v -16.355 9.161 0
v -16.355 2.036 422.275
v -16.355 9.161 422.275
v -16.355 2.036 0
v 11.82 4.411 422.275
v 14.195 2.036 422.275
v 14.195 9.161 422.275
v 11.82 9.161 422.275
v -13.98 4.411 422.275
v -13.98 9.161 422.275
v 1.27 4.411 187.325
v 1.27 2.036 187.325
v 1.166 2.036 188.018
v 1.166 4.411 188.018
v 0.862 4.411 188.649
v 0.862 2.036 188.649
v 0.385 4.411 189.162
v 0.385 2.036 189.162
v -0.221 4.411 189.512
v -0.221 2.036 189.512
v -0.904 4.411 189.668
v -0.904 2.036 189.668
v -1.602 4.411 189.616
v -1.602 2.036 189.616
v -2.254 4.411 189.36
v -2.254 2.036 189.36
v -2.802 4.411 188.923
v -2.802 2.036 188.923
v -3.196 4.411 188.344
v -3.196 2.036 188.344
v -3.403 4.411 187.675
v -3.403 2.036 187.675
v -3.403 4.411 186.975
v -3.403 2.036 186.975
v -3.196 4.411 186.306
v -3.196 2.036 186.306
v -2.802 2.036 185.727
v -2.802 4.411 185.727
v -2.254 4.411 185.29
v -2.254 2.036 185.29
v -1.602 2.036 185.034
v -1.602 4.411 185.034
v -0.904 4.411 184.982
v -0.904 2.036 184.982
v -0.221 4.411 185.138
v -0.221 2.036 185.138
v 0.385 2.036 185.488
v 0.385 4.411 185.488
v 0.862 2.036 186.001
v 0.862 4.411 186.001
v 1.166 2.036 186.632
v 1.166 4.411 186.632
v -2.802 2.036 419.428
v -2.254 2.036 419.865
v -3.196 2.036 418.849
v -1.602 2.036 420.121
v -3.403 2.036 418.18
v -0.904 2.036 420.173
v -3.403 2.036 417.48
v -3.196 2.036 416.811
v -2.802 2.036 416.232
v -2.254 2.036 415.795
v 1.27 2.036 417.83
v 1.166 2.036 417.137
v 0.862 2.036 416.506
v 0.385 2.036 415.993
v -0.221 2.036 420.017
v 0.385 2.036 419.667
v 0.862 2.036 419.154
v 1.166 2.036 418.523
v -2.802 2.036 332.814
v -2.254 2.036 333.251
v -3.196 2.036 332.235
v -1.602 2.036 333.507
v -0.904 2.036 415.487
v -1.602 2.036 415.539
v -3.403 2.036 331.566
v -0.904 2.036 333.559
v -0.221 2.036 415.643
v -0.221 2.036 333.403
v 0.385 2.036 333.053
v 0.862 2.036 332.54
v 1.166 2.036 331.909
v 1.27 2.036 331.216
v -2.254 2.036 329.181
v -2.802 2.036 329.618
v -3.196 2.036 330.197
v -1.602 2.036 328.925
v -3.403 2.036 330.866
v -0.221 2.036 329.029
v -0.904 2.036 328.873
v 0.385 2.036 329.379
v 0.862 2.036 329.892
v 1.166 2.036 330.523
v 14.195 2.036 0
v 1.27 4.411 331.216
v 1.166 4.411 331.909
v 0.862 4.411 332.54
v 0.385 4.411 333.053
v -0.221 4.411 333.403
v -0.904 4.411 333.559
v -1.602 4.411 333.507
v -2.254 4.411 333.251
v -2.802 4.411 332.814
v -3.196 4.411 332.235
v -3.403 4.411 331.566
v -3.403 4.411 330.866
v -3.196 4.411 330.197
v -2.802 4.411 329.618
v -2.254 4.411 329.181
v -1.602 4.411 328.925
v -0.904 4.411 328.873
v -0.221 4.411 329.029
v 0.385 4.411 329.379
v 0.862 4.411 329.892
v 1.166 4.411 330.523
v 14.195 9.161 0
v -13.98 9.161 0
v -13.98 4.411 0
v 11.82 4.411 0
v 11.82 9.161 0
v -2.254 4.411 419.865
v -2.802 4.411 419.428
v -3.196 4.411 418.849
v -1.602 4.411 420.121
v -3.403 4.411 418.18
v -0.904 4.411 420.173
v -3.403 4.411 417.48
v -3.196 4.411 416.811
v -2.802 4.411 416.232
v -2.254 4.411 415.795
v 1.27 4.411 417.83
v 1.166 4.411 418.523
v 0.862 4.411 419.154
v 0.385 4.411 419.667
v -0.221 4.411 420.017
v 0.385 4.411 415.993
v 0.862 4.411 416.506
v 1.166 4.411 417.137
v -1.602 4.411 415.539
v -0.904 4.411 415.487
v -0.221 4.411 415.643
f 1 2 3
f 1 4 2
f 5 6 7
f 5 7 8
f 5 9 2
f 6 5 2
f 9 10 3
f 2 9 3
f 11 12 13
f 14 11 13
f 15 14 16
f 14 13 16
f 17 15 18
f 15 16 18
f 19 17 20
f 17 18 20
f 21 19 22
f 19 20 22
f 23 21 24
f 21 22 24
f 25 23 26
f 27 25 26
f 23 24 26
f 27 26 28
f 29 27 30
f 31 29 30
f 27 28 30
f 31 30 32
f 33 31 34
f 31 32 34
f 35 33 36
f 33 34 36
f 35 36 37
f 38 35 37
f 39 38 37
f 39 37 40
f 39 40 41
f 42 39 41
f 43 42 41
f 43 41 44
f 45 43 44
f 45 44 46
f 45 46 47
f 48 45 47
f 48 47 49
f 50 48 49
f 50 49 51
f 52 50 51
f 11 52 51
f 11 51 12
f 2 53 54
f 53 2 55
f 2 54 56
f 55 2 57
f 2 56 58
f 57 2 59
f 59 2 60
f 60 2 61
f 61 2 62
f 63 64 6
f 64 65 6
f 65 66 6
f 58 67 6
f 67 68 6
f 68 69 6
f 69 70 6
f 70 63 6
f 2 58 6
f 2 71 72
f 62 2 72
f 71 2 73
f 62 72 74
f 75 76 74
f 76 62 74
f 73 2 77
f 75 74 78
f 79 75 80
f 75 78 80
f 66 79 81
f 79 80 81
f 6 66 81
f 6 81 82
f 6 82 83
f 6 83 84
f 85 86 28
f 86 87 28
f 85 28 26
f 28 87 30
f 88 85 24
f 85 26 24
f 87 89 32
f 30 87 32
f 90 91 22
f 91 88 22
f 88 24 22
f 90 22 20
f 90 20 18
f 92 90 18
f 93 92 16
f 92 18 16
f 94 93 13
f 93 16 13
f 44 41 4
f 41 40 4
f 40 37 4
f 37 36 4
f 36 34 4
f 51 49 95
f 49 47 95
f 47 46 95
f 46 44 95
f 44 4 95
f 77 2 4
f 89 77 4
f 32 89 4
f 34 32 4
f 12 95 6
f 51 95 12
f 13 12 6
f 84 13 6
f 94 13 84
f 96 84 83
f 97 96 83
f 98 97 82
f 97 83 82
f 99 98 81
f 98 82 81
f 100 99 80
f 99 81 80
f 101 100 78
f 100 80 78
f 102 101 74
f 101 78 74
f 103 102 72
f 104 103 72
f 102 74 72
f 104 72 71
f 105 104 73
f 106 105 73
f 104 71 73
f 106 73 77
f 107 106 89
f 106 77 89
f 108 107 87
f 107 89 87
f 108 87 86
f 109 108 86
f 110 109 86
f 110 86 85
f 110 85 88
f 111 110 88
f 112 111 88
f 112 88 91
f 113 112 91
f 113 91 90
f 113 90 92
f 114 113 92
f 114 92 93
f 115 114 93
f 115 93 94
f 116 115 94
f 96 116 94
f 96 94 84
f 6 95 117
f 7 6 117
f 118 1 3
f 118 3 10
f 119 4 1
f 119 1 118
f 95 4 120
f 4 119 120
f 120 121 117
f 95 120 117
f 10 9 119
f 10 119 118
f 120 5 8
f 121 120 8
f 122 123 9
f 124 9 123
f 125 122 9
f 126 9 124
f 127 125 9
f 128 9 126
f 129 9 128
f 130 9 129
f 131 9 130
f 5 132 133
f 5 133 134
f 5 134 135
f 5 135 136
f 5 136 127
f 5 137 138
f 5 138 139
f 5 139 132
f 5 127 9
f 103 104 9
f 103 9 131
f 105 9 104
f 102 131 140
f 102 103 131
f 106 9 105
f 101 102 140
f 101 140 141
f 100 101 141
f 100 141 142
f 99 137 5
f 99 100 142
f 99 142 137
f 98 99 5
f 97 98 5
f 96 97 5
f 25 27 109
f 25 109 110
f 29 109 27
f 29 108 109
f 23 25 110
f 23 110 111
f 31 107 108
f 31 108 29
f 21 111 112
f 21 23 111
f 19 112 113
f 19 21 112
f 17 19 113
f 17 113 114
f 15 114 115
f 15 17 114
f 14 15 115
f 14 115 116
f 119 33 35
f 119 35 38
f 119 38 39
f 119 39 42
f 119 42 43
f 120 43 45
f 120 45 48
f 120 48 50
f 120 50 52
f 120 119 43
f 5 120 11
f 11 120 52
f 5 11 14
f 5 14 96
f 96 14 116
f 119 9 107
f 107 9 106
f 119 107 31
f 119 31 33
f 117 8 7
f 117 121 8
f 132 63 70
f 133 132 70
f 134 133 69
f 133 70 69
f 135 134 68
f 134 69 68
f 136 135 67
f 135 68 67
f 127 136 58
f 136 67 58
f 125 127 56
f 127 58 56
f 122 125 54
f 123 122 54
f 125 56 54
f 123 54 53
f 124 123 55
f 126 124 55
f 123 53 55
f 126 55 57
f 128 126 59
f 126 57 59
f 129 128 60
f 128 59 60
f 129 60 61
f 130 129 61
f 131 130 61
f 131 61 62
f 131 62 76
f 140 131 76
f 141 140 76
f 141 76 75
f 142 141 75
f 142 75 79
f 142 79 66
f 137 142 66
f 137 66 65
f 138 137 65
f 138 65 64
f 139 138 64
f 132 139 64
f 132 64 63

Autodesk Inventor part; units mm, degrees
ref_plane "YZ Plane" through (0, 0, 0) normal (1, 0, 0) x (0, 1, 0)
ref_plane "XZ Plane" through (0, 0, 0) normal (0, 1, 0) x (-1, 0, 0)
ref_plane "XY Plane" through (0, 0, 0) normal (0, 0, 1) x (1, 0, 0)
sketch "Sketch1" plane through (0, 0, 0) normal (0, 0, 1) x (1, 0, 0)
  line L0 (-18.7296, 9.1612) -> (16.5704, 9.1612)
  line L1 (16.5704, 9.1612) -> (16.5704, -0.3388)
  line L2 (16.5704, -0.3388) -> (-18.7296, -0.3388)
  line L3 (-18.7296, -0.3388) -> (-18.7296, 9.1612)
  line L4 (-18.7296, 4.4112) -> (16.5704, 4.4112)
  line L5 (-18.7296, 4.4112) -> (-18.7296, -0.3388)
  line L6 (-18.7296, 2.0362) -> (16.5704, 2.0362)
  line L7 (16.5704, 4.4112) -> (14.1954, 2.0362)
  line L8 (16.5704, 4.4112) -> (19.9291, 4.4112) construction
  line L9 (-18.7296, 4.4112) -> (-16.3546, 2.0362)
  line L10 (-16.3546, 2.0362) -> (-16.3546, 9.1612)
  line L11 (14.1954, 2.0362) -> (14.1954, 9.1612)
  line L12 (-16.3546, 4.4112) -> (-13.9796, 2.0362)
  line L13 (14.1954, 4.4112) -> (11.8204, 2.0362)
  line L14 (11.8204, 2.0362) -> (11.8204, 9.1612)
  line L15 (-13.9796, 2.0362) -> (-13.9796, 9.1612)
  point P0 (0, 0)
  dimension "d0" = 35.3
  dimension "d1" = 9.5
  dimension "d2" = 135
extrude "Extrusion1" add sketch "Sketch1" along normal blind 445 contours L0 L15 L4 L10 | L12 L6 L10 | L4 L15 L12 | L0 L11 L4 L14 | L4 L14 L6 L15 | L4 L13 L14 | L13 L11 L6
sketch "Sketch2" plane through (-13.9796, 4.4112, 0) normal (0, 1, 0) x (1, 0, 0)
  line L0 (0, -445) -> (25.8, -445) projected
  line L1 (12.9, -445) -> (12.9, -416.7)
  circle A0 centre (12.9, -416.7) radius 2.15
  line L2 (12.9, -416.7) -> (12.9, -64.7)
  circle A1 centre (12.9, -64.7) radius 2.15
  line L3 (12.9, -416.7) -> (12.9, -32.7)
  circle A2 centre (12.9, -32.7) radius 2.15
  point P0 (13.9796, 0)
  dimension "d5" = 28.3
  dimension "d6" = 4.3
  dimension "d7" = 352
  dimension "d8" = 384
extrude "Extrusion2" cut sketch "Sketch2" against normal blind 445
sketch "Sketch3" plane through (0, 0, 445) normal (0, 0, 1) x (1, 0, 0)
  line L0 (14.1954, 2.0362) -> (-16.3546, 2.0362) projected
  line L1 (14.1954, 9.1612) -> (14.1954, 2.0362) projected
  line L2 (11.8204, 9.1612) -> (14.1954, 9.1612) projected
  line L3 (11.8204, 4.4112) -> (11.8204, 9.1612) projected
  line L4 (-13.9796, 4.4112) -> (11.8204, 4.4112) projected
  line L5 (-13.9796, 9.1612) -> (-13.9796, 4.4112) projected
  line L6 (-16.3546, 9.1612) -> (-13.9796, 9.1612) projected
  line L7 (-16.3546, 2.0362) -> (-16.3546, 9.1612) projected
  point P0 (0, 0)
extrude "Extrusion3" cut sketch "Sketch3" against normal blind 419.1
sketch "Sketch4" plane through (0, 0, 0) normal (0, 0, -1) x (-1, 0, 0)
  line L0 (-14.1954, 2.0362) -> (-14.1954, 9.1612) projected
  line L1 (16.3546, 2.0362) -> (-14.1954, 2.0362) projected
  line L2 (16.3546, 9.1612) -> (16.3546, 2.0362) projected
  line L3 (13.9796, 9.1612) -> (16.3546, 9.1612) projected
  line L4 (13.9796, 4.4112) -> (13.9796, 9.1612) projected
  line L5 (-11.8204, 4.4112) -> (13.9796, 4.4112) projected
  line L6 (-11.8204, 9.1612) -> (-11.8204, 4.4112) projected
  line L7 (-14.1954, 9.1612) -> (-11.8204, 9.1612) projected
  point P0 (0, 0)
extrude "Extrusion4" add sketch "Sketch4" against normal blind 422.275
sketch "Sketch5" plane through (-16.3546, 2.0362, 0) normal (0, -1, 0) x (1, 0, 0)
  line L0 (30.55, 422.275) -> (0, 422.275) projected
  line L1 (15.275, 422.275) -> (15.275, 331.216)
  circle A0 centre (15.275, 331.216) radius 2.3495
  line L2 (15.275, 422.275) -> (15.275, 187.325)
  circle A1 centre (15.275, 187.325) radius 2.3495
  point P0 (16.3546, 0)
  dimension "d15" = 91.059
  dimension "d16" = 4.699
  dimension "d17" = 234.95
extrude "Extrusion5" cut sketch "Sketch5" against normal blind 422.275
sketch "Sketch6" plane through (-16.3546, 2.0362, 0) normal (0, -1, 0) x (1, 0, 0)
  line L0 (30.55, 422.275) -> (0, 422.275) projected
  line L1 (15.275, 422.275) -> (15.275, 417.83)
  circle A0 centre (15.275, 417.83) radius 2.3495
  point P0 (16.3546, 0)
  dimension "d20" = 4.445
extrude "Extrusion6" cut sketch "Sketch6" against normal blind 422.275
properties part number "2"
